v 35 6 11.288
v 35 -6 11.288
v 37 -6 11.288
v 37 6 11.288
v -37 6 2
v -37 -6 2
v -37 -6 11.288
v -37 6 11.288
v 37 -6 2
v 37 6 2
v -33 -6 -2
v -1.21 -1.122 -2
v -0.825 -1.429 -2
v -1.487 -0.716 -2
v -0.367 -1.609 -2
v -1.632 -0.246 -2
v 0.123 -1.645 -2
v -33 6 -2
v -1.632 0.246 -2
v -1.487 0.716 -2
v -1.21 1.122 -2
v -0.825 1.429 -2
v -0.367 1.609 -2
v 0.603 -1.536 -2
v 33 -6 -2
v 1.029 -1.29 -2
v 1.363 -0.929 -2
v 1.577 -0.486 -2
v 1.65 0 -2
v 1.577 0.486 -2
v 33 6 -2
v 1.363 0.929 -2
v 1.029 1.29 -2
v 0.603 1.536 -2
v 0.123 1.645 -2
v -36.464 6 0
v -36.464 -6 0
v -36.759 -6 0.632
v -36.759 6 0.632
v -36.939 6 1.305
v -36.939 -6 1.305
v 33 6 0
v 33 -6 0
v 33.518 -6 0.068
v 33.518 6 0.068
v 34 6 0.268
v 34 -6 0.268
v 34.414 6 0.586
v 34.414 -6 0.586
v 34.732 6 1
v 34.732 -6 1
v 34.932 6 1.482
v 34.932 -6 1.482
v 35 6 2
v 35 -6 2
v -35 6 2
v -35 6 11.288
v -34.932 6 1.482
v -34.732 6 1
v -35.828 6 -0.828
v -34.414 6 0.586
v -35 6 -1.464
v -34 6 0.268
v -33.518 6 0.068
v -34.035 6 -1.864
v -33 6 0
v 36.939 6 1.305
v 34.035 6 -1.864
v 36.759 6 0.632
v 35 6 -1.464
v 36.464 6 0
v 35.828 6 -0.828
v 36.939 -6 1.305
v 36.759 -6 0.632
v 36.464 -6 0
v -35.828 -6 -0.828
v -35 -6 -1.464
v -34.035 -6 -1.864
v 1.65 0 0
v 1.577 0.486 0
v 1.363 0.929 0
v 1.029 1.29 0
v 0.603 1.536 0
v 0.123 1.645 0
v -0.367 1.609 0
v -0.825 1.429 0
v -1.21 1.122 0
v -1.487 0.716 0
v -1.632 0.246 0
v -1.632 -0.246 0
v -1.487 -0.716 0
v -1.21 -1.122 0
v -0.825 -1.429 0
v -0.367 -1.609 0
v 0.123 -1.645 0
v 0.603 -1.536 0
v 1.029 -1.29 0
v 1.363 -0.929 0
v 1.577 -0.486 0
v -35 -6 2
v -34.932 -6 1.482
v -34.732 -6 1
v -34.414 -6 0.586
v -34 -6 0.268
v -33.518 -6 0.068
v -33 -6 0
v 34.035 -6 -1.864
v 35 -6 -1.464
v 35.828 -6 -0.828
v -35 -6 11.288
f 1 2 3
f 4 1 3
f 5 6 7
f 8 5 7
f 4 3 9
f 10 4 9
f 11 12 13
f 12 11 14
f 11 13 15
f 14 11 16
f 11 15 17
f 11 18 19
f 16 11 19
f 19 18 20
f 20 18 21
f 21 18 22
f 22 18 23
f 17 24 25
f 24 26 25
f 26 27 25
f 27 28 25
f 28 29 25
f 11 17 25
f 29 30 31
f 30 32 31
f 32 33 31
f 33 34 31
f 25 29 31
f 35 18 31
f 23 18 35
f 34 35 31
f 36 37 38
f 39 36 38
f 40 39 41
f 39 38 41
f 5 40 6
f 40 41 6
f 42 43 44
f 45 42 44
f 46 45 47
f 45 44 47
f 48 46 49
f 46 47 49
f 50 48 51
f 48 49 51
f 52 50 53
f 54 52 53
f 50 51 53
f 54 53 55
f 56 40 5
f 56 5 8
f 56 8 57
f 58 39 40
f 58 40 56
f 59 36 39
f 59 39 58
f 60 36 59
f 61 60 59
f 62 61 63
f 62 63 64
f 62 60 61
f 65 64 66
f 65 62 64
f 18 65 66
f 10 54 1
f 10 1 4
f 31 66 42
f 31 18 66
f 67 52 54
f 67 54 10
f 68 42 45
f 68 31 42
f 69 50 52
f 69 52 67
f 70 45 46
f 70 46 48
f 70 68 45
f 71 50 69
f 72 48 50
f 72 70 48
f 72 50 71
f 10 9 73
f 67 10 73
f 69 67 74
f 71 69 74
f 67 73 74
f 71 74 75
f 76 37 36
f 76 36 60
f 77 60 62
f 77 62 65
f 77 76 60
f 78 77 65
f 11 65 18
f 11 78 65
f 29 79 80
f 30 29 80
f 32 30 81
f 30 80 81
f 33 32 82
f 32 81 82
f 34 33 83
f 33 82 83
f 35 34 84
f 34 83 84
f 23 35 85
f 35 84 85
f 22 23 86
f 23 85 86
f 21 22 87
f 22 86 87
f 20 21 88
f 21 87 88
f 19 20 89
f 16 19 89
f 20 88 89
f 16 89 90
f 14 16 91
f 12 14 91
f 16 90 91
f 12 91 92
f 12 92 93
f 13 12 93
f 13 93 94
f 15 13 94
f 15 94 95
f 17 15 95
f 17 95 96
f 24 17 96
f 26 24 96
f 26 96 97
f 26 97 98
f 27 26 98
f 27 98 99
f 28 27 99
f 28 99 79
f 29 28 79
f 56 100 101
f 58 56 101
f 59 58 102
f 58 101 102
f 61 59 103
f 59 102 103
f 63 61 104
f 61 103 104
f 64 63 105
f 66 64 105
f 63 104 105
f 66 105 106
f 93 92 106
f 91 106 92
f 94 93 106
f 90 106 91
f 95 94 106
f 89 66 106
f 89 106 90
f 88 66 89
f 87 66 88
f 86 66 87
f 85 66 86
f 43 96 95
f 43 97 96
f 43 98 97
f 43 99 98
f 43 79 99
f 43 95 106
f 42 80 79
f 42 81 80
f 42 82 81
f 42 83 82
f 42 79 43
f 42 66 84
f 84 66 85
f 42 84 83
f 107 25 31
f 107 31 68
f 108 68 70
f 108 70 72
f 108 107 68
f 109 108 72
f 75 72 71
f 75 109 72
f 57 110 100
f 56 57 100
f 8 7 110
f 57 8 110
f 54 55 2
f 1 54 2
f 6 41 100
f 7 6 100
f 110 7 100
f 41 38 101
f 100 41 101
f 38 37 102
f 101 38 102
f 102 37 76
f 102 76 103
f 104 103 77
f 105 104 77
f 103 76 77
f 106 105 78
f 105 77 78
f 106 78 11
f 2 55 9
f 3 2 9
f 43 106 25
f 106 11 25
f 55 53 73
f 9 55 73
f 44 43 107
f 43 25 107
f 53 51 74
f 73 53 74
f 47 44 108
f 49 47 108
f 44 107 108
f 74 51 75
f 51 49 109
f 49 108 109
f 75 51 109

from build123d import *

# Parameters (mm, degrees)
ESBO_O1_W                                      = 94
ESBO_O1_H                                      = 12
FLANGE_BASE1_DEPTH                             = 2
DOBRA_START                                    = -6
DOBRA_ESBO_ADA1_DEPTH                          = 12
DOBRA_ESBO_ADA1_2_DEPTH                        = 12
BROCA_DE_ROSQUEAR_DE_CANO_PARA_TARRAXA_D_D     = 3.3
BROCA_DE_ROSQUEAR_DE_CANO_PARA_TARRAXA_D_DEPTH = 4
BROCA_DE_ROSQUEAR_DE_CANO_PARA_TARRAXA_D_TIP   = 0.991420021


# Read off the part's stored shape, not the designer's step: Dobra esboçada1
# Sheet-metal steps are written as plain solids
with BuildPart() as part:
    # Esboço1 → Flange-base1 (new body)
    with BuildSketch(Plane.XY):
        Rectangle(ESBO_O1_W, ESBO_O1_H)
    extrude(amount=-FLANGE_BASE1_DEPTH)

    # Dobra esboçada1 outline → Dobra esboçada1 (cut)
    with BuildSketch(Plane(origin=(0, 0, 0), x_dir=(1, 0, 0), z_dir=(0, 1, 0)).offset(DOBRA_START)):
        with BuildLine():
            ThreePointArc((-36.464101616, 0), (-35, 1.464101615), (-33, 2))
            Line((-33, 2), (-47, 2))
            Line((-47, 2), (-47, 0))
            Line((-47, 0), (-36.464101616, 0))
        make_face()
        with BuildLine():
            Line((47, 2), (33, 2))
            ThreePointArc((33, 2), (35, 1.464101615), (36.464101616, 0))
            Line((36.464101616, 0), (47, 0))
            Line((47, 0), (47, 2))
        make_face()
    extrude(amount=DOBRA_ESBO_ADA1_DEPTH, mode=Mode.SUBTRACT)

    # Dobra esbo_ada1 2 outline → Dobra esbo_ada1 2 (add)
    with BuildSketch(Plane(origin=(0, 0, 0), x_dir=(1, 0, 0), z_dir=(0, 1, 0)).offset(DOBRA_START)):
        with BuildLine():
            Line((-33, 0), (-36.464101616, 0))
            ThreePointArc((-36.464101616, 0), (-36.863703305, -0.96472382), (-37, -2))
            Line((-37, -2), (-37, -11.28761102))
            Line((-37, -11.28761102), (-35, -11.28761102))
            Line((-35, -11.28761102), (-35, -2))
            ThreePointArc((-35, -2), (-34.414213562, -0.585786438), (-33, 0))
        make_face()
        with BuildLine():
            ThreePointArc((37, -2), (36.863703305, -0.96472382), (36.464101616, 0))
            Line((36.464101616, 0), (33, 0))
            ThreePointArc((33, 0), (34.414213562, -0.585786438), (35, -2))
            Line((35, -2), (35, -11.28761102))
            Line((35, -11.28761102), (37, -11.28761102))
            Line((37, -11.28761102), (37, -2))
        make_face()
    extrude(amount=DOBRA_ESBO_ADA1_2_DEPTH)

    # Broca de rosquear de cano para tarraxa de 1/81
    with Locations(Plane(origin=(0, 0, -2), x_dir=(-1, 0, 0), z_dir=(0, 0, -1))):
        with Locations((0, 0)):
            Hole(BROCA_DE_ROSQUEAR_DE_CANO_PARA_TARRAXA_D_D / 2, depth=BROCA_DE_ROSQUEAR_DE_CANO_PARA_TARRAXA_D_DEPTH)
            with Locations((0, 0, -(BROCA_DE_ROSQUEAR_DE_CANO_PARA_TARRAXA_D_DEPTH + BROCA_DE_ROSQUEAR_DE_CANO_PARA_TARRAXA_D_TIP / 2))):  # 118° drill point
                Cone(0, BROCA_DE_ROSQUEAR_DE_CANO_PARA_TARRAXA_D_D / 2, BROCA_DE_ROSQUEAR_DE_CANO_PARA_TARRAXA_D_TIP, mode=Mode.SUBTRACT)


solid = part.part
